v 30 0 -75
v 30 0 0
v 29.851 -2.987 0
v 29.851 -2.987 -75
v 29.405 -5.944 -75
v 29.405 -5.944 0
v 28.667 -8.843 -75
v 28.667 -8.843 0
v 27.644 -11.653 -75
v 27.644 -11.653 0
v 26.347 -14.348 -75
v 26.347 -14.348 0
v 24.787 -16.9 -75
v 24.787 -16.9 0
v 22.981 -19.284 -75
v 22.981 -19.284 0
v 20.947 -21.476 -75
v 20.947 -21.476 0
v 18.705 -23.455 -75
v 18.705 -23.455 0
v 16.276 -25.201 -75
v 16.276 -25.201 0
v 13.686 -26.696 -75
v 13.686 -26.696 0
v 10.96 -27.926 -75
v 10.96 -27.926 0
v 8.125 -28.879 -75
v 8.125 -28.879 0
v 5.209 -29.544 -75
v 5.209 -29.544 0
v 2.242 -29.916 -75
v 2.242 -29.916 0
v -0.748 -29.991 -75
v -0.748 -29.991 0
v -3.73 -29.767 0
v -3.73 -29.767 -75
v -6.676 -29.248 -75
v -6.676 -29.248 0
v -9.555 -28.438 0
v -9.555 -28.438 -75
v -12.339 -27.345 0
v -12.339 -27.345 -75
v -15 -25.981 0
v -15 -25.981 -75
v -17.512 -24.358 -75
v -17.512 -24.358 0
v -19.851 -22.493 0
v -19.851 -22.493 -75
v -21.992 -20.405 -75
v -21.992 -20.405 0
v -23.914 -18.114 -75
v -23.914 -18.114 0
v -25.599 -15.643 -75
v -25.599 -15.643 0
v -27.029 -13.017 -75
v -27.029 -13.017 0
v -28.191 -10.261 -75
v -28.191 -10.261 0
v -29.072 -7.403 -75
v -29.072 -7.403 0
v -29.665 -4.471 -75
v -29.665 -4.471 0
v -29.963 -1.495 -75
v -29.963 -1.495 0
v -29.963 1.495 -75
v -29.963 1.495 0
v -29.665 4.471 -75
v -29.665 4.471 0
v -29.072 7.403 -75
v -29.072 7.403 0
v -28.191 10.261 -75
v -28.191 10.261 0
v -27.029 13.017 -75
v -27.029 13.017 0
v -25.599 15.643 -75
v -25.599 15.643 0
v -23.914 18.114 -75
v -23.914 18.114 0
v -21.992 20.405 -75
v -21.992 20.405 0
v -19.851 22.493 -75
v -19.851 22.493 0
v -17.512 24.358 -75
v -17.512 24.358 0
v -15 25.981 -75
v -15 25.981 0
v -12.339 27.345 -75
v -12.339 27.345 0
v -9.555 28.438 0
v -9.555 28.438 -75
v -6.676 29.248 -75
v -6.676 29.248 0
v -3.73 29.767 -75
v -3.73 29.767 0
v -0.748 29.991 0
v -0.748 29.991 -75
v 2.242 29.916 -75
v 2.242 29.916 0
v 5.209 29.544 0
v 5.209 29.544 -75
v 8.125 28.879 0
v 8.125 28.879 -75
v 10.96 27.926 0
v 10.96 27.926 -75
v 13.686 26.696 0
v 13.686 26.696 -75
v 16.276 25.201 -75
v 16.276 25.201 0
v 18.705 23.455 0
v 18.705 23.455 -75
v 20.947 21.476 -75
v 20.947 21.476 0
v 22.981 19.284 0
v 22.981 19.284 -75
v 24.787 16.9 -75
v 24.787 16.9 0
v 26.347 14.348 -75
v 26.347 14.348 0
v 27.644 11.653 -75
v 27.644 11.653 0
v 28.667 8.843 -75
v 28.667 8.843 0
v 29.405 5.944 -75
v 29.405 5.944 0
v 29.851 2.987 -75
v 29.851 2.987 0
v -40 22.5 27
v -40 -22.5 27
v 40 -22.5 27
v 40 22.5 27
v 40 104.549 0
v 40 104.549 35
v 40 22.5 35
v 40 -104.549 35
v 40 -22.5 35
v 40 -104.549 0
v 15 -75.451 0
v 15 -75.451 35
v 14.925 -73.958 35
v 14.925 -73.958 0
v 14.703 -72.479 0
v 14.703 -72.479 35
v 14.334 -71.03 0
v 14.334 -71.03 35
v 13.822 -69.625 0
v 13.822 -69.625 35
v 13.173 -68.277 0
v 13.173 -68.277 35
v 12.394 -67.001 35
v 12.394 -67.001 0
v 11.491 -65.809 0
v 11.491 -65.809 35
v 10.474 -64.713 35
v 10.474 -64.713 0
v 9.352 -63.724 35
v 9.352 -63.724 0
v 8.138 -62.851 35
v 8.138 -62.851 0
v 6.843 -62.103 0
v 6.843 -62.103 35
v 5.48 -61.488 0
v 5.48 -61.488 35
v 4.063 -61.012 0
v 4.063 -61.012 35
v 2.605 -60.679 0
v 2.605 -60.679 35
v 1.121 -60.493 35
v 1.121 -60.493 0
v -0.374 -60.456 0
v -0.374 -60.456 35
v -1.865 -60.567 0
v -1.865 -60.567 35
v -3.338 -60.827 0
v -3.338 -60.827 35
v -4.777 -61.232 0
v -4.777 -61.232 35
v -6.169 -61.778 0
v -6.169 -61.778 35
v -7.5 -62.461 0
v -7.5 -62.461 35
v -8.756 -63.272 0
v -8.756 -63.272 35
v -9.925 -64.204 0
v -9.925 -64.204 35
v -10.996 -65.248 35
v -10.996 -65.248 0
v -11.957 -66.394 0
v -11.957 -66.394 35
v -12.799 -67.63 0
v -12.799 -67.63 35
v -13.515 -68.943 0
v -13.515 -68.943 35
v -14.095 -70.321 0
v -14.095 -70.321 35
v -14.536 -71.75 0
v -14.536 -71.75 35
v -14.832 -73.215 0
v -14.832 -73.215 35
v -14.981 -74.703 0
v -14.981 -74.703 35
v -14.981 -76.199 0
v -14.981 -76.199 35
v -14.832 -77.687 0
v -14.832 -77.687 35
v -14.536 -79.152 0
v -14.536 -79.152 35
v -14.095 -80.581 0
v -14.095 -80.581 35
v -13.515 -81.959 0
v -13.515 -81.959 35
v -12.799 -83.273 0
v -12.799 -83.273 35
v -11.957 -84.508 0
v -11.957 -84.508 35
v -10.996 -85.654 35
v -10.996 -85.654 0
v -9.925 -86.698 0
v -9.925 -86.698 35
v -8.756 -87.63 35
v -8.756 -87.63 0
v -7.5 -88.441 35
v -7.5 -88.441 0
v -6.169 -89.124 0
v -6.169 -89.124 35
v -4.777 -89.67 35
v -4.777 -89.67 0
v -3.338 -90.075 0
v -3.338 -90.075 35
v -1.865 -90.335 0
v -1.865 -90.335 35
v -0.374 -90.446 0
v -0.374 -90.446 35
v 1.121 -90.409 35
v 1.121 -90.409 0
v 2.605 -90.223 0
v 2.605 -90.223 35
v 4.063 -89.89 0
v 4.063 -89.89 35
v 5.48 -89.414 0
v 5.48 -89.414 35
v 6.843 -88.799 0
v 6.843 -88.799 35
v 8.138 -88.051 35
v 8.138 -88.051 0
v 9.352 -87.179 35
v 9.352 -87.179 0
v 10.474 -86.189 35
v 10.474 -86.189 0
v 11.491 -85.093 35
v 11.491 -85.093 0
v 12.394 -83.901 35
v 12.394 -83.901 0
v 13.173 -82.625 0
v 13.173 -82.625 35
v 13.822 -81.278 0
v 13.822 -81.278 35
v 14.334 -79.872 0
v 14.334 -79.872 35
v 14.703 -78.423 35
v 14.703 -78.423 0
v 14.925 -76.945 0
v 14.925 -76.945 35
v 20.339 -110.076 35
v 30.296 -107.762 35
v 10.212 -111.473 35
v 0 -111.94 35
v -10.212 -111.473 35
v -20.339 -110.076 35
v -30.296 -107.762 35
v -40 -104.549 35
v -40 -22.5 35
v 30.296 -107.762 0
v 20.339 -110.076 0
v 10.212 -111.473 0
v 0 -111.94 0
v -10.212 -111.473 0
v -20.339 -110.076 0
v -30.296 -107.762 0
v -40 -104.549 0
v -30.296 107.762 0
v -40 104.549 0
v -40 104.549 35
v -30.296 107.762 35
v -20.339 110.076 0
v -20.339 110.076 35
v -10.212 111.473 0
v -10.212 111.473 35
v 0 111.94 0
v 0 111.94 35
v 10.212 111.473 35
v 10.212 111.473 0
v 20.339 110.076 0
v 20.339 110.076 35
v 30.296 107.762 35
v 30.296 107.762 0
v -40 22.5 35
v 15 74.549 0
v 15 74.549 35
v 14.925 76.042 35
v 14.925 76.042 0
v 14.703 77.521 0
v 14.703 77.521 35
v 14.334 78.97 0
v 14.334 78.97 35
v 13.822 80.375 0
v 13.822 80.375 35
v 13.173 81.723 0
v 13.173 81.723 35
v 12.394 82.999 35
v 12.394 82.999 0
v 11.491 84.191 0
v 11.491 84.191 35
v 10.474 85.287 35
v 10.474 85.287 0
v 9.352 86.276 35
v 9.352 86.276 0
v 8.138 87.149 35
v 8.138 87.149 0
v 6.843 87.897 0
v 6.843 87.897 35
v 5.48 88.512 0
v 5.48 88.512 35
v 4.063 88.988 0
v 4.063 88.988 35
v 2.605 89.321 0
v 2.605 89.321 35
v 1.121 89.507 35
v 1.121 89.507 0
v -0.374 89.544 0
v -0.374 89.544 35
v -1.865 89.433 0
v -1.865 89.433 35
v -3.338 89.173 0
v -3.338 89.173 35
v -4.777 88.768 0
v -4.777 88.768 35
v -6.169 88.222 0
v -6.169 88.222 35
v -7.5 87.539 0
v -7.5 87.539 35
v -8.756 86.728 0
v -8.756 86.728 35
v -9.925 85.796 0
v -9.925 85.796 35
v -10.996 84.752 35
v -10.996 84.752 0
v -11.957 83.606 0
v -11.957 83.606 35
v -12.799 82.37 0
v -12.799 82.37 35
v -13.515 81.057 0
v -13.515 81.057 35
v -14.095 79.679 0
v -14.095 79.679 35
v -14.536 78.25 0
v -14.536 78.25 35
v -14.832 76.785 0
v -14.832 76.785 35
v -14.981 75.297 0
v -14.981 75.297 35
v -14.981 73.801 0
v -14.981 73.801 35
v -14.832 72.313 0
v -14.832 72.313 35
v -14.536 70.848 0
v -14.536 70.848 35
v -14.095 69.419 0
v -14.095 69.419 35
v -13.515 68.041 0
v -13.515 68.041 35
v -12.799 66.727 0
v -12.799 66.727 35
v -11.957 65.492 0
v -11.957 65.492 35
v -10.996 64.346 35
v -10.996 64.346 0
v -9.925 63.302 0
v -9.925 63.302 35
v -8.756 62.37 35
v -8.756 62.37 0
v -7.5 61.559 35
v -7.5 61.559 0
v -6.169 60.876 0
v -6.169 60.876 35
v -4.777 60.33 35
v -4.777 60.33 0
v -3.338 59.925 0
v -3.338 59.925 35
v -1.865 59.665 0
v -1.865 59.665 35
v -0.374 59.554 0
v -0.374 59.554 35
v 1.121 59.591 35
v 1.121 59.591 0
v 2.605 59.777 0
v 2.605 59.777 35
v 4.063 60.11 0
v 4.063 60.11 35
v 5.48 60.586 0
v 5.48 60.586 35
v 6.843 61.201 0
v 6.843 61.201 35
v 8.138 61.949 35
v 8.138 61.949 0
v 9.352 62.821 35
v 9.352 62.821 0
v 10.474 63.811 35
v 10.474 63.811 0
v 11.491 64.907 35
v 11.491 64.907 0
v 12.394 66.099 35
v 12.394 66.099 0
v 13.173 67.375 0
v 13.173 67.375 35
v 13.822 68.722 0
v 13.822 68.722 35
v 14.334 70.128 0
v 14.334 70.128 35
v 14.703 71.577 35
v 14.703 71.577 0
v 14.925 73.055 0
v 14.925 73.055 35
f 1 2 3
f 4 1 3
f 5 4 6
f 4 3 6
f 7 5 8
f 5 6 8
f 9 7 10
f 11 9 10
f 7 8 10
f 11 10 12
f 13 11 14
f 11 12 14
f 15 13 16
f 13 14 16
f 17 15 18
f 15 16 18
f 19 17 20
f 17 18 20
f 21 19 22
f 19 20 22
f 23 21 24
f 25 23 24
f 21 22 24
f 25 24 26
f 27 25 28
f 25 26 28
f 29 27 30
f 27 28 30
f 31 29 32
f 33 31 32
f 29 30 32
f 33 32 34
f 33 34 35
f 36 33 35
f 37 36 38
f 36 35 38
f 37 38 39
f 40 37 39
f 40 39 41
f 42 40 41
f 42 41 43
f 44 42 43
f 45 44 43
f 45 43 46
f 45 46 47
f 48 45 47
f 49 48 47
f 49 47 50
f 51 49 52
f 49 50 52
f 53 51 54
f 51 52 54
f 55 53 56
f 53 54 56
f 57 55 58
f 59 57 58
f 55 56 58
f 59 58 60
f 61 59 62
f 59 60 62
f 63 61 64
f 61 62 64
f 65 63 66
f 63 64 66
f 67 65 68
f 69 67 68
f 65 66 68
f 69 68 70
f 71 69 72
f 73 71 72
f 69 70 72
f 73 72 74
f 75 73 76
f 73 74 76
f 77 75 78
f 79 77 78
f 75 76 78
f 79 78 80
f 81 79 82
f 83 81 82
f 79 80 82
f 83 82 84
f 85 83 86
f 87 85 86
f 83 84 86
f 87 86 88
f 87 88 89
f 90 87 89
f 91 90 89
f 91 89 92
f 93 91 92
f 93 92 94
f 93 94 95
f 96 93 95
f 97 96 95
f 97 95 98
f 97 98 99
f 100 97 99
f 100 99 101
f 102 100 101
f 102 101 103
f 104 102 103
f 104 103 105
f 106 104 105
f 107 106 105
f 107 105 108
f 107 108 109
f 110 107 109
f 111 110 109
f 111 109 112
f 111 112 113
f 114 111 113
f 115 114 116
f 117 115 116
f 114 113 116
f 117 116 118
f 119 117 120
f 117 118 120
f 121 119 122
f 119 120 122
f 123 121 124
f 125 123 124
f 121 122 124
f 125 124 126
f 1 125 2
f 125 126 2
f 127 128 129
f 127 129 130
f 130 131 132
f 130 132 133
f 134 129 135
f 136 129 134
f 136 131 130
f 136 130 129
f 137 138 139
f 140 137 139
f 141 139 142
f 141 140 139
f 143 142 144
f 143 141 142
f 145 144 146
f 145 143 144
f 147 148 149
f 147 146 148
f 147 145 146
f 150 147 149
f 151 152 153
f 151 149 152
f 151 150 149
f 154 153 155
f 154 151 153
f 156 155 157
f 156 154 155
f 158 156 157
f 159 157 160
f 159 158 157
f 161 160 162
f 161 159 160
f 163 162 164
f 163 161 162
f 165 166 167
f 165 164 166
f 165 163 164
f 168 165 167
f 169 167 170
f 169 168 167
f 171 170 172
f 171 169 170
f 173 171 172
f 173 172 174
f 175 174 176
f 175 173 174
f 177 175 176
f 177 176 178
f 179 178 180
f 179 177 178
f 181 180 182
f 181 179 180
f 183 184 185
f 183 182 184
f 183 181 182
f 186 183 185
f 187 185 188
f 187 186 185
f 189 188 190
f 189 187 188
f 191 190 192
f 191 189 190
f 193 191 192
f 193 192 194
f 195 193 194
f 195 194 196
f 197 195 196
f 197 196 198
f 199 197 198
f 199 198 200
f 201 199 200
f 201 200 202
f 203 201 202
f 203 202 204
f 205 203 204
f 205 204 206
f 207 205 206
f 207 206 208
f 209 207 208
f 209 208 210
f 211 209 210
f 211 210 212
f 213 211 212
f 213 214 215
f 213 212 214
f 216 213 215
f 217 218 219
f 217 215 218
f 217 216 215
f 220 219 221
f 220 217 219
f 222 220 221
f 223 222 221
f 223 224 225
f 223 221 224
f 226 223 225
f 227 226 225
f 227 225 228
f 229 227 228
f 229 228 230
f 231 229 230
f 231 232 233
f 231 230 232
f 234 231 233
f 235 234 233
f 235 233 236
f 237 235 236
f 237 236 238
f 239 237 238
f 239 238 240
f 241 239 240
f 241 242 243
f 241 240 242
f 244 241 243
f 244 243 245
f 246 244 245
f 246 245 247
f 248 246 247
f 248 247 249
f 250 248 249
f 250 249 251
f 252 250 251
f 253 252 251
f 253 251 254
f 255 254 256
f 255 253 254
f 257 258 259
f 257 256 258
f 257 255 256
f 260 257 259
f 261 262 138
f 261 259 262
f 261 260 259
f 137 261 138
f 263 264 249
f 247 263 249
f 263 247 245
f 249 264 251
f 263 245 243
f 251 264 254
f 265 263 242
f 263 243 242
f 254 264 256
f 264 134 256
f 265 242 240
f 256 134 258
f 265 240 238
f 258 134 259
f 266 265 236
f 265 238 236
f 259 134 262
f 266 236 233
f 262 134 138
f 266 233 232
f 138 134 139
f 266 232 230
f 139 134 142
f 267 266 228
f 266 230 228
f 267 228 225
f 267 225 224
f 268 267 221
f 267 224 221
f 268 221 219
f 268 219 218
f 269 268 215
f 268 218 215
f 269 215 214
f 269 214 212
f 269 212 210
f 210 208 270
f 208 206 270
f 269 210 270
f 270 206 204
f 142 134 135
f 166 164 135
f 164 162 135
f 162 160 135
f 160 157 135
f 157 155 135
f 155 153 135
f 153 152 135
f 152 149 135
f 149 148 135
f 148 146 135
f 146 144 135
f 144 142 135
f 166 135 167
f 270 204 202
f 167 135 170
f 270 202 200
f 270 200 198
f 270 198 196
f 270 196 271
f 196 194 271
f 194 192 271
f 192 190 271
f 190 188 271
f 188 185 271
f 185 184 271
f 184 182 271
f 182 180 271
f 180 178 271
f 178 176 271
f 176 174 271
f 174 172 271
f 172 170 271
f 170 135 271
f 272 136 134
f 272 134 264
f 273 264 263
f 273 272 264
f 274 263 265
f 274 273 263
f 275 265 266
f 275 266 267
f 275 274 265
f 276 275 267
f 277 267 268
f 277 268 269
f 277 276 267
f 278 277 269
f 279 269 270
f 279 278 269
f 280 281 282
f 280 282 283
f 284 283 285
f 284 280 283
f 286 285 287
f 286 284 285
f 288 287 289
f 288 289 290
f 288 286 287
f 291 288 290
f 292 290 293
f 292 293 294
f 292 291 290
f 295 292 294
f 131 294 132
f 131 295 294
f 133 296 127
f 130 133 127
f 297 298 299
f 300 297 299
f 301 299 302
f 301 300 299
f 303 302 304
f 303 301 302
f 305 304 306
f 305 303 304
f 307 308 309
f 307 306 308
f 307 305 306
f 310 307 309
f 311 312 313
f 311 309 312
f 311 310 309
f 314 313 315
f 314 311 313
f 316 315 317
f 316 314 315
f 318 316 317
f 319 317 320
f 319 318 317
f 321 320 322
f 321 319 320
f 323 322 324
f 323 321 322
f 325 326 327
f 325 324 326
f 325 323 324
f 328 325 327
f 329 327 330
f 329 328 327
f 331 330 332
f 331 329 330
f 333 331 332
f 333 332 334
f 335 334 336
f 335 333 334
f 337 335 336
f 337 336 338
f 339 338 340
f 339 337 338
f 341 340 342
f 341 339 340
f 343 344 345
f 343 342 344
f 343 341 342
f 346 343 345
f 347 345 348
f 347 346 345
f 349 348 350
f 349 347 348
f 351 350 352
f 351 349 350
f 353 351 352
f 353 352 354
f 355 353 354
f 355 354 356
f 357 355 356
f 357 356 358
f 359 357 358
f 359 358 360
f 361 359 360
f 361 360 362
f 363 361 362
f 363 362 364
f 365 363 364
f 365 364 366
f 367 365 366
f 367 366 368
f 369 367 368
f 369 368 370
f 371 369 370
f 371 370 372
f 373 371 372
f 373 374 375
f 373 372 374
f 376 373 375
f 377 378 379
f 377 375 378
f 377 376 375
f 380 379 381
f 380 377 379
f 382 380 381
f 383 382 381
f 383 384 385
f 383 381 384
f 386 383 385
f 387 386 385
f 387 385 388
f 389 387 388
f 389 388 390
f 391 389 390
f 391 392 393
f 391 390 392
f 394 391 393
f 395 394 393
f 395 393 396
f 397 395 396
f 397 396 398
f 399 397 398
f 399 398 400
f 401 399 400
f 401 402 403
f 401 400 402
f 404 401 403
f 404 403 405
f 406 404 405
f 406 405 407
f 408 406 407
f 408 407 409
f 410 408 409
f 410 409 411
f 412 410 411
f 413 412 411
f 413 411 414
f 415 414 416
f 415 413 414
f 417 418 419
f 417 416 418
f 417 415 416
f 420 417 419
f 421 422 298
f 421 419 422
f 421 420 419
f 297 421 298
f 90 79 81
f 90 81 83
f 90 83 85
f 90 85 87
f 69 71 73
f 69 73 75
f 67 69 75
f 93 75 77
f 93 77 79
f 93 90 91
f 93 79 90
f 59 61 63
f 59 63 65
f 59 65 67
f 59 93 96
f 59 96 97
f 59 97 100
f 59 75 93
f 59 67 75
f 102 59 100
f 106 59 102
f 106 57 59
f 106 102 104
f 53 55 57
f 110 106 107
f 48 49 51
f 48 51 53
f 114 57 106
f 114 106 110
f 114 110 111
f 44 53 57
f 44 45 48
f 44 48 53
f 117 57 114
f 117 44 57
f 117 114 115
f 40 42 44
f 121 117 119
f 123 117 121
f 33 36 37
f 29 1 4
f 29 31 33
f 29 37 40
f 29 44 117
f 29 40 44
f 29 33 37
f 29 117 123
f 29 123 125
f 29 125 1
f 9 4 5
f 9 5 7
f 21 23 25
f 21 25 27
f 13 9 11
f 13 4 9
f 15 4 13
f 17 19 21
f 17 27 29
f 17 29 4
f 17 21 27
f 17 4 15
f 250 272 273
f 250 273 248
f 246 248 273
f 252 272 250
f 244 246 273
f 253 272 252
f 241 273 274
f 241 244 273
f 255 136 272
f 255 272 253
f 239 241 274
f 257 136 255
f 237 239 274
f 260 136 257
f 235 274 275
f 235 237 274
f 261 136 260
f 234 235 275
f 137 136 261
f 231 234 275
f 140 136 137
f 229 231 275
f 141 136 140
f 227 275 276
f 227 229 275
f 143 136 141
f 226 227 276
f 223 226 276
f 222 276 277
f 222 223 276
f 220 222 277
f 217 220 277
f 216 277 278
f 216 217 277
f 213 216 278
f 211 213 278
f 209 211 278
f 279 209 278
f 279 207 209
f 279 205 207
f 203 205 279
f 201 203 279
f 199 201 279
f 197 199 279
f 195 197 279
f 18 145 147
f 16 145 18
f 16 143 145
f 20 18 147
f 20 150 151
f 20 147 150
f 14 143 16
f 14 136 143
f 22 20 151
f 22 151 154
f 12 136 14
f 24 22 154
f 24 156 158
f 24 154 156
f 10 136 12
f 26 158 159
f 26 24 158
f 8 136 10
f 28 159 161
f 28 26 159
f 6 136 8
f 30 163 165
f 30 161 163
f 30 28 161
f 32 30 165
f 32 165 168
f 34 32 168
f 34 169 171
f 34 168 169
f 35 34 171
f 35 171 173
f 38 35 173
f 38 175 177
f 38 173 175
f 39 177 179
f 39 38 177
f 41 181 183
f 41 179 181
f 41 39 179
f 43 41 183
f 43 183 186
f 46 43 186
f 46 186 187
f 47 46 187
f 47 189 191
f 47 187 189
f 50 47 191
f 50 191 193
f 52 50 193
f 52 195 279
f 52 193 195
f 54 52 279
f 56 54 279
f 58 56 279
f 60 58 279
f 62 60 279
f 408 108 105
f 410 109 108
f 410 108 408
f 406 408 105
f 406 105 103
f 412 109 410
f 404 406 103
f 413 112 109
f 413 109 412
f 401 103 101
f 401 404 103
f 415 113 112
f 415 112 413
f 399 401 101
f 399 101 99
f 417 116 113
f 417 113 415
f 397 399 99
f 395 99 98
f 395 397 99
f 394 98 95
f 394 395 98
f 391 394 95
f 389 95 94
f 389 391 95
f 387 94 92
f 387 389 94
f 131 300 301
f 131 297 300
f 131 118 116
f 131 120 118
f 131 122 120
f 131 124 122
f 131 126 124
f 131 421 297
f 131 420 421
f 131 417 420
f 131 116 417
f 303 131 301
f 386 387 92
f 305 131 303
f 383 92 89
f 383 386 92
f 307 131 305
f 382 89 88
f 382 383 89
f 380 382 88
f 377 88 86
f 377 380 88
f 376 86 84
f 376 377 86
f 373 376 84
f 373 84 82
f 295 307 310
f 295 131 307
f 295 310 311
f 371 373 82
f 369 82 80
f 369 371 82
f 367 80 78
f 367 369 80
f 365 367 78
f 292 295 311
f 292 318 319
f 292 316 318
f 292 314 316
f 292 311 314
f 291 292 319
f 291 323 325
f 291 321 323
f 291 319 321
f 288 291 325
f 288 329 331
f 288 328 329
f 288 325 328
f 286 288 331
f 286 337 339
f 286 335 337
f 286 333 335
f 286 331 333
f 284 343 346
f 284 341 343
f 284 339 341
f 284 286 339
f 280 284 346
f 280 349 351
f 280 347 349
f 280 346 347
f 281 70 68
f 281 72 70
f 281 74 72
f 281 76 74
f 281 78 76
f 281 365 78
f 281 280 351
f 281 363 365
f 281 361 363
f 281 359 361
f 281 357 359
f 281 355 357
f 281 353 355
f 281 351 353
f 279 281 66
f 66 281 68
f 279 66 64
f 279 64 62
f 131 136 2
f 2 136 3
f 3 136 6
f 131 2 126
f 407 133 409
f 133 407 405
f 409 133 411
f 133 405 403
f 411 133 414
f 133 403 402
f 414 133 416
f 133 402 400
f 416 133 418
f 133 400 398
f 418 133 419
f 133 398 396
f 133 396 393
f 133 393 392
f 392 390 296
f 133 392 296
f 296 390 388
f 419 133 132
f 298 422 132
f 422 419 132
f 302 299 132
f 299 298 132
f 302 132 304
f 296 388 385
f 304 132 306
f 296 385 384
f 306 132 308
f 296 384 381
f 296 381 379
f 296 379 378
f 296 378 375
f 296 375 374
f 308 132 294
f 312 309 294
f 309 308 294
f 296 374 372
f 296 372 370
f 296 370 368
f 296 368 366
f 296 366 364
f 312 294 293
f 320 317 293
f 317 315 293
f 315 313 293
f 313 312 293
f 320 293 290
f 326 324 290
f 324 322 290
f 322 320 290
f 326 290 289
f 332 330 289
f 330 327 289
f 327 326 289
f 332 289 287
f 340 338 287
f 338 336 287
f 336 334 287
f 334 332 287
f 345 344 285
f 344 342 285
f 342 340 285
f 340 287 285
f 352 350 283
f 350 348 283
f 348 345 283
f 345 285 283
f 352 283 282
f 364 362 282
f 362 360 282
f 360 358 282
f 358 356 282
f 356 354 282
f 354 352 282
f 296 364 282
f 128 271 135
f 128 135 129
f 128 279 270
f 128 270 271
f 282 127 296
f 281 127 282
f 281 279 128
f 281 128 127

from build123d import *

# Parameters (mm, degrees)
BOSS_EXTRUDE1_DEPTH     = 35
CUT_EXTRUDE1_DEPTH      = 124.917223134
CUT_EXTRUDE1_DEPTH_BACK = 124.917223134
SKETCH2_W               = 8
SKETCH2_H               = 45
CUT_EXTRUDE2_DEPTH      = 124.917223134
CUT_EXTRUDE2_DEPTH_BACK = 124.917223134
SKETCH3_R               = 15
CUT_EXTRUDE3_DEPTH      = 124.917223134
CUT_EXTRUDE3_DEPTH_BACK = 124.917223134
SKETCH4_R               = 15
SKETCH5_R               = 30
BOSS_EXTRUDE2_DEPTH     = 75


with BuildPart() as part:
    # Sketch1 → Boss-Extrude1 (new body)
    with BuildSketch(Plane.XY):
        with BuildLine():
            Line((-40, -104.548927251), (-40, 104.548927251))
            ThreePointArc((-40, 104.548927251), (0, 111.939618497), (40, 104.548927251))
            Line((40, 104.548927251), (40, -104.548927251))
            ThreePointArc((40, -104.548927251), (0, -111.939618497), (-40, -104.548927251))
        make_face()
    extrude(amount=BOSS_EXTRUDE1_DEPTH)

    # Sketch2 → Cut-Extrude1 (cut, two sides: drawn at the far end of the back side and taken through both)
    with BuildSketch(Plane(origin=(0, 0, 0), x_dir=(0, 0, -1), z_dir=(1, 0, 0)).offset(-CUT_EXTRUDE1_DEPTH_BACK)):
        with Locations((-31, 0)):
            Rectangle(SKETCH2_W, SKETCH2_H)
    extrude(amount=CUT_EXTRUDE1_DEPTH + CUT_EXTRUDE1_DEPTH_BACK, mode=Mode.SUBTRACT)

    # Sketch3 → Cut-Extrude2 (cut, two sides: drawn at the far end of the back side and taken through both)
    with BuildSketch(Plane.XY.offset(-CUT_EXTRUDE2_DEPTH_BACK)):
        with Locations((0, 74.548927251)):
            Circle(SKETCH3_R)
    extrude(amount=CUT_EXTRUDE2_DEPTH + CUT_EXTRUDE2_DEPTH_BACK, mode=Mode.SUBTRACT)

    # Sketch4 → Cut-Extrude3 (cut, two sides: drawn at the far end of the back side and taken through both)
    with BuildSketch(Plane.XY.offset(-CUT_EXTRUDE3_DEPTH_BACK)):
        with Locations((0, -75.451072749)):
            Circle(SKETCH4_R)
    extrude(amount=CUT_EXTRUDE3_DEPTH + CUT_EXTRUDE3_DEPTH_BACK, mode=Mode.SUBTRACT)

    # Sketch5 → Boss-Extrude2 (add)
    with BuildSketch(Plane(origin=(0, 0, 0), x_dir=(-1, 0, 0), z_dir=(0, 0, -1))):
        with Locations(Location((0, 0, 0), (0, 0, 180))):
            Circle(SKETCH5_R)
    extrude(amount=BOSS_EXTRUDE2_DEPTH)


solid = part.part
